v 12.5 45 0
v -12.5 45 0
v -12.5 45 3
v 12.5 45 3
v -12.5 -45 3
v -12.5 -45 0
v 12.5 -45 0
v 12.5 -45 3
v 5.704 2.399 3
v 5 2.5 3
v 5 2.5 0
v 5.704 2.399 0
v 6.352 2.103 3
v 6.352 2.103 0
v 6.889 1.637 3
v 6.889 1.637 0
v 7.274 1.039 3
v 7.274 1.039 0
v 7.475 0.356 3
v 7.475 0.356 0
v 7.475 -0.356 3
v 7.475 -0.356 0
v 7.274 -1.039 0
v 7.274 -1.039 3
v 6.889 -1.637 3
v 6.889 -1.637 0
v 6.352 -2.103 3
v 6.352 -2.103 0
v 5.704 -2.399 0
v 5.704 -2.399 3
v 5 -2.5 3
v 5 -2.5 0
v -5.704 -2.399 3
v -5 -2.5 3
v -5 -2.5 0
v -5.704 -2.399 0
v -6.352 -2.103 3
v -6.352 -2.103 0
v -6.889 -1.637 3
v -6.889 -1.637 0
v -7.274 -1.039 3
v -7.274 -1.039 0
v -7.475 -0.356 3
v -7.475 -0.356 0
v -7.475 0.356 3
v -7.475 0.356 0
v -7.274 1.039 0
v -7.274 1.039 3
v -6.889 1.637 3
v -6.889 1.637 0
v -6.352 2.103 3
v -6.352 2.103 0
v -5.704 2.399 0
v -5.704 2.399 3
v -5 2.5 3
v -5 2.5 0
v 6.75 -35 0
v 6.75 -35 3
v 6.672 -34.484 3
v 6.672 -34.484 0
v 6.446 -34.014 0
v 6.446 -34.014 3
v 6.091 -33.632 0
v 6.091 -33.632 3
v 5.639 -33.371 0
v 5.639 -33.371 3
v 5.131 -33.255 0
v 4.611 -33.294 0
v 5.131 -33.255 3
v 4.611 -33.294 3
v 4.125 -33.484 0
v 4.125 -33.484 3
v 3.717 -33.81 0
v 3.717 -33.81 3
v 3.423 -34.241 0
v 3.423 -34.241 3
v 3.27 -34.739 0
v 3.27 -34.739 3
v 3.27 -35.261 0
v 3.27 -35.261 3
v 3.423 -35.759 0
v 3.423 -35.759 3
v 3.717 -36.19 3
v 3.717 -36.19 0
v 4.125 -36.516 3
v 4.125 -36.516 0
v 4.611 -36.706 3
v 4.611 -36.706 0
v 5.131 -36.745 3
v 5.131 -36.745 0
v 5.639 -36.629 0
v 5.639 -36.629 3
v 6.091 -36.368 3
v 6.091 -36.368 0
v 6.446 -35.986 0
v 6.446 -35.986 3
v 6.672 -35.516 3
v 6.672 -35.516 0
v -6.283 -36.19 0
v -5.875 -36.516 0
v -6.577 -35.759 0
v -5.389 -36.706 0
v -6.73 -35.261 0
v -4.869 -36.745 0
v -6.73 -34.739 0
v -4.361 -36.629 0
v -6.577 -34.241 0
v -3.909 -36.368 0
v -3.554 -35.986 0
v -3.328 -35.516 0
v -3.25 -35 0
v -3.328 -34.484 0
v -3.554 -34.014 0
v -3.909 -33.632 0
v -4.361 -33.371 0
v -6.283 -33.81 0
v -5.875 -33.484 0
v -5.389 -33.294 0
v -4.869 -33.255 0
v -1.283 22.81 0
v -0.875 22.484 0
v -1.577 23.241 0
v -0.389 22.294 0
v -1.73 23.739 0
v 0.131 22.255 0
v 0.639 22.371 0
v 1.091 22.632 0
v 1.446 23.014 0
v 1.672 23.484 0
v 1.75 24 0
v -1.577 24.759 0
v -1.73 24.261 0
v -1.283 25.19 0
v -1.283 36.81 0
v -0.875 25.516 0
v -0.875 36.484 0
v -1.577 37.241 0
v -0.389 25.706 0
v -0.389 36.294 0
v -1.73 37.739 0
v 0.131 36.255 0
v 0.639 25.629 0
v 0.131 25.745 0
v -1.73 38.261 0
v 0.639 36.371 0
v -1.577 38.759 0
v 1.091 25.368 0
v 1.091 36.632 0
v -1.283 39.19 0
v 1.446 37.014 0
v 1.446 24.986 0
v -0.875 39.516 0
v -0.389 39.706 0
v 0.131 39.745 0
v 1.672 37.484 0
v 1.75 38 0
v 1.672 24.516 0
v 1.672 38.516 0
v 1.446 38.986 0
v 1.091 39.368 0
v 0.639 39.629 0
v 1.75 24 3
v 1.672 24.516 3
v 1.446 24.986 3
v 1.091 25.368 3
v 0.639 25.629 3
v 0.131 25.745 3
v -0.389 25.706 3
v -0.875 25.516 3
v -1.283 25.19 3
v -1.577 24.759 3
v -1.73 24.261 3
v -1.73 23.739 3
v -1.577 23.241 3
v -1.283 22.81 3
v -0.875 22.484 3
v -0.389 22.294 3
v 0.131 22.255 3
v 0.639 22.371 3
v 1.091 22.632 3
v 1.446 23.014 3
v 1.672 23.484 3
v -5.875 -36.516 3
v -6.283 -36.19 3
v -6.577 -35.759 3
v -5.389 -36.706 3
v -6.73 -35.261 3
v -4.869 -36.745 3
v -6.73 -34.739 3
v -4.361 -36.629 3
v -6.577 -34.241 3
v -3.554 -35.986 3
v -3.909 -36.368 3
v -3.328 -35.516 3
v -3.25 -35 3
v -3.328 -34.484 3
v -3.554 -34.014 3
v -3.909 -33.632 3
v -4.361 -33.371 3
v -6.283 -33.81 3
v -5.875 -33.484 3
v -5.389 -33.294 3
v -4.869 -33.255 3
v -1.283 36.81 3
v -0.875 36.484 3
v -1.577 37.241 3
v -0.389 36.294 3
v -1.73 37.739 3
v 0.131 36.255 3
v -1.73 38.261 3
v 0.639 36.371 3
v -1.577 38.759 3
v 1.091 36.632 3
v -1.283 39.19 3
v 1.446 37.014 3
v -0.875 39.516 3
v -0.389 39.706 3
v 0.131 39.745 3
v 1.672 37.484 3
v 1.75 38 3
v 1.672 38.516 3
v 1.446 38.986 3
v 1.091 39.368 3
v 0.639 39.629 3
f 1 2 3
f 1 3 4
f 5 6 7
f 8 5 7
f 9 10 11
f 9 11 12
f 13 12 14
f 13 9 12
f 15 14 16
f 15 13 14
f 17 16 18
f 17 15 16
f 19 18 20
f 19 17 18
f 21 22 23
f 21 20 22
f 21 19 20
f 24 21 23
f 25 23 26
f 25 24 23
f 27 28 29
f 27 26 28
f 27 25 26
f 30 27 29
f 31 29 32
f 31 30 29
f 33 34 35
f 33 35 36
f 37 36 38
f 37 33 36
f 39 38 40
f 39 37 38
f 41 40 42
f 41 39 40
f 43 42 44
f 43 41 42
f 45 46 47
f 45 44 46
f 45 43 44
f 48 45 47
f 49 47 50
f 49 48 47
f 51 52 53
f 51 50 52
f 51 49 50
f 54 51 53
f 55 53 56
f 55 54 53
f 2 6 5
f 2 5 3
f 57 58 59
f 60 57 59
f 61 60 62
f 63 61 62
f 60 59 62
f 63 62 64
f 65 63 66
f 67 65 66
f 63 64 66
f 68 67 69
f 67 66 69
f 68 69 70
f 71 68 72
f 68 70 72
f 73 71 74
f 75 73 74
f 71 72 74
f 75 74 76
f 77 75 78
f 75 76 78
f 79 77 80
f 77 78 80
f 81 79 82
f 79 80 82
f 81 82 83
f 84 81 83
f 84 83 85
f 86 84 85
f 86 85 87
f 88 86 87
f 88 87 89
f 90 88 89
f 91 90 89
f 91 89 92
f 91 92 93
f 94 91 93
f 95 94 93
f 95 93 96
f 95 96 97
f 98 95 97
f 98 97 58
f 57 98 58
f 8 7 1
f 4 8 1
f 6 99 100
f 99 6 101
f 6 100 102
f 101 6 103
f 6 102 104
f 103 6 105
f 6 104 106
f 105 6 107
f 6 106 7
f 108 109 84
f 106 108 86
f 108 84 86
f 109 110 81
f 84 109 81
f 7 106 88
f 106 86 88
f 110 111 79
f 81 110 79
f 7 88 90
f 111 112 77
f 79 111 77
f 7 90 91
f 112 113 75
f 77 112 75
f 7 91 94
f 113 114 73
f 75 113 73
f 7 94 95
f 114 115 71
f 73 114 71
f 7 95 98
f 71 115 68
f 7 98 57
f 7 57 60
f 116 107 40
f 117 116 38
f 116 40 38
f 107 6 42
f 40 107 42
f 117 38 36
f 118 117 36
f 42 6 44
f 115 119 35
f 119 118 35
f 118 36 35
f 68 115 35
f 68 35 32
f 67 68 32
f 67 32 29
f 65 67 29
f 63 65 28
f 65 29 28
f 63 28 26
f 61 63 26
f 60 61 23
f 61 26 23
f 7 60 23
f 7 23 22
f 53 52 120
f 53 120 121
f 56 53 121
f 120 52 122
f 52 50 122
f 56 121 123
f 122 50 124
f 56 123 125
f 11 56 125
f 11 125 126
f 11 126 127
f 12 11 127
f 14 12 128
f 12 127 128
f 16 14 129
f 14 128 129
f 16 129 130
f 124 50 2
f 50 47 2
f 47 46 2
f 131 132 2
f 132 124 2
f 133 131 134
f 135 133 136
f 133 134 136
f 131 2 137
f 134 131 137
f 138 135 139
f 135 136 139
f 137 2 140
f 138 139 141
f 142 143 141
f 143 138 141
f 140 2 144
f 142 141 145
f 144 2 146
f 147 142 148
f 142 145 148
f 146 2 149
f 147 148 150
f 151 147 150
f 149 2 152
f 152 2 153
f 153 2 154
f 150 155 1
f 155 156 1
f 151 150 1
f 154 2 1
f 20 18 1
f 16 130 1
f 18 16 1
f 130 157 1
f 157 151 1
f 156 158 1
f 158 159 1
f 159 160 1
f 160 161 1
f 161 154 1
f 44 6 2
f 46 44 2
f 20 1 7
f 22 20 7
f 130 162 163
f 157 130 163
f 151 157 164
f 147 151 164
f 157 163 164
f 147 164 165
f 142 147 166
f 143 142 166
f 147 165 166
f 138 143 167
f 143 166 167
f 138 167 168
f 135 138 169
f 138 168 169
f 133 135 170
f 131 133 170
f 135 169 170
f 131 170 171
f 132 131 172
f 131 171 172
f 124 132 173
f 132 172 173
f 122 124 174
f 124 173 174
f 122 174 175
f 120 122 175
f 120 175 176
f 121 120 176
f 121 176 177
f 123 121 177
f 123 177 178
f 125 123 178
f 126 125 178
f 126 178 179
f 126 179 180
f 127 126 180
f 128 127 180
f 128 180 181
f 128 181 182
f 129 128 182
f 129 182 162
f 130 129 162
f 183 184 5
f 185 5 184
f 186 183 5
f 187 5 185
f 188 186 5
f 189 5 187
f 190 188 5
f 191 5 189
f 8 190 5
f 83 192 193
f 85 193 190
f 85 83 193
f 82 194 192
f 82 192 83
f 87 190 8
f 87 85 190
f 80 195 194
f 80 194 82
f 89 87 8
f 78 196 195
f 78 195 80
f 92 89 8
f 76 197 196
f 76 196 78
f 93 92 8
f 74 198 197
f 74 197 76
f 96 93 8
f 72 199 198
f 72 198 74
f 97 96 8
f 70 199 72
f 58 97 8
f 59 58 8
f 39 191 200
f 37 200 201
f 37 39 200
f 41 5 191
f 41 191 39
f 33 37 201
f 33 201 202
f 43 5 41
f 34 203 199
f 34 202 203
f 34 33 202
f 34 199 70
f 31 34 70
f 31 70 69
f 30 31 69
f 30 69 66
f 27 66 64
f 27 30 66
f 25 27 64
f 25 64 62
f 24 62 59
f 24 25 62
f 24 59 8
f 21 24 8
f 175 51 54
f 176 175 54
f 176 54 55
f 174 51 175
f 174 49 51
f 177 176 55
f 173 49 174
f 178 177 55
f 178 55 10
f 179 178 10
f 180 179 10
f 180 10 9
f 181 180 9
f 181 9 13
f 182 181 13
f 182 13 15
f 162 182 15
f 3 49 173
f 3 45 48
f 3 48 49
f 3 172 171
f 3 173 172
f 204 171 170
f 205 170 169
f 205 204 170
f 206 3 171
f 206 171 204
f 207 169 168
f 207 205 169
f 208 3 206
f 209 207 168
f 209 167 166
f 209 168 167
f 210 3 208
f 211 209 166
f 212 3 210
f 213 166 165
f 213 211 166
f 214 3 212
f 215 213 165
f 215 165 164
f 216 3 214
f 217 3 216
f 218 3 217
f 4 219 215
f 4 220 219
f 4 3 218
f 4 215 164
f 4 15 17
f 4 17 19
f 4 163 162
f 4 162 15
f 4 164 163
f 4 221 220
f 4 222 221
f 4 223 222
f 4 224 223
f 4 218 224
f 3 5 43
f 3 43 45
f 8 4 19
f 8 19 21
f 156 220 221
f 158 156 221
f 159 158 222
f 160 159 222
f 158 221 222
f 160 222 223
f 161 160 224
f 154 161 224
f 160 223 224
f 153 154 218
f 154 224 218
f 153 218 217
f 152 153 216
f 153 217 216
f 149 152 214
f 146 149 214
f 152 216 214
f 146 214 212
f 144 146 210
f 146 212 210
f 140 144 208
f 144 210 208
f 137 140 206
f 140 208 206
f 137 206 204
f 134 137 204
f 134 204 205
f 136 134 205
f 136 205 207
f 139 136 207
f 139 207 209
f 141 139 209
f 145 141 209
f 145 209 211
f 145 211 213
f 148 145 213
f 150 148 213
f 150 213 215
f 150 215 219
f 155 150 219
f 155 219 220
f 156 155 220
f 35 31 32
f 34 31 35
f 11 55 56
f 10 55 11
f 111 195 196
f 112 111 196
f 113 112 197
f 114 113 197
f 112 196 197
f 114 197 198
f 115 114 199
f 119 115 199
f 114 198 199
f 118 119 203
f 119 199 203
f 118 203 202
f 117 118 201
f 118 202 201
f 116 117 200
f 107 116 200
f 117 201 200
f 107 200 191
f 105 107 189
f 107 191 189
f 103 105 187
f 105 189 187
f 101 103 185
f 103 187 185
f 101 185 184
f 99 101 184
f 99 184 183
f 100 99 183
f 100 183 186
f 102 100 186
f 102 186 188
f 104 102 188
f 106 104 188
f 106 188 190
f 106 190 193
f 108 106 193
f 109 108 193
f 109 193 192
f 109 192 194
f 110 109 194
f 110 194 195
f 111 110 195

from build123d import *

# Parameters (mm, degrees)
SKETCH_1_W          = 25
SKETCH_1_H          = 90
EXTRUDE_1_DEPTH     = 3
SKETCH_3_R          = 1.75
CUT_EXTRUDE_1_DEPTH = 4
CUT_EXTRUDE_2_DEPTH = 4


with BuildPart() as part:
    # 草图1 → 凸台-拉伸1 (new body)
    with BuildSketch(Plane.XY):
        Rectangle(SKETCH_1_W, SKETCH_1_H)
    extrude(amount=EXTRUDE_1_DEPTH)

    # 草图3 → 切除-拉伸1 (cut, through all)
    with BuildSketch(Plane.XY.offset(3)):
        with Locations((0, 38)):
            Circle(SKETCH_3_R)
        with Locations((0, 24)):
            Circle(SKETCH_3_R)
        with Locations((-5, -35)):
            Circle(SKETCH_3_R)
        with Locations((5, -35)):
            Circle(SKETCH_3_R)
    extrude(amount=-CUT_EXTRUDE_1_DEPTH, mode=Mode.SUBTRACT)

    # 草图4 → 切除-拉伸2 (cut, through all)
    with BuildSketch(Plane.XY.offset(3)):
        with BuildLine():
            Line((-5, 2.5), (5, 2.5))
            ThreePointArc((5, 2.5), (7.5, 0), (5, -2.5))
            Line((5, -2.5), (-5, -2.5))
            ThreePointArc((-5, -2.5), (-7.5, 0), (-5, 2.5))
        make_face()
    extrude(amount=-CUT_EXTRUDE_2_DEPTH, mode=Mode.SUBTRACT)


solid = part.part
